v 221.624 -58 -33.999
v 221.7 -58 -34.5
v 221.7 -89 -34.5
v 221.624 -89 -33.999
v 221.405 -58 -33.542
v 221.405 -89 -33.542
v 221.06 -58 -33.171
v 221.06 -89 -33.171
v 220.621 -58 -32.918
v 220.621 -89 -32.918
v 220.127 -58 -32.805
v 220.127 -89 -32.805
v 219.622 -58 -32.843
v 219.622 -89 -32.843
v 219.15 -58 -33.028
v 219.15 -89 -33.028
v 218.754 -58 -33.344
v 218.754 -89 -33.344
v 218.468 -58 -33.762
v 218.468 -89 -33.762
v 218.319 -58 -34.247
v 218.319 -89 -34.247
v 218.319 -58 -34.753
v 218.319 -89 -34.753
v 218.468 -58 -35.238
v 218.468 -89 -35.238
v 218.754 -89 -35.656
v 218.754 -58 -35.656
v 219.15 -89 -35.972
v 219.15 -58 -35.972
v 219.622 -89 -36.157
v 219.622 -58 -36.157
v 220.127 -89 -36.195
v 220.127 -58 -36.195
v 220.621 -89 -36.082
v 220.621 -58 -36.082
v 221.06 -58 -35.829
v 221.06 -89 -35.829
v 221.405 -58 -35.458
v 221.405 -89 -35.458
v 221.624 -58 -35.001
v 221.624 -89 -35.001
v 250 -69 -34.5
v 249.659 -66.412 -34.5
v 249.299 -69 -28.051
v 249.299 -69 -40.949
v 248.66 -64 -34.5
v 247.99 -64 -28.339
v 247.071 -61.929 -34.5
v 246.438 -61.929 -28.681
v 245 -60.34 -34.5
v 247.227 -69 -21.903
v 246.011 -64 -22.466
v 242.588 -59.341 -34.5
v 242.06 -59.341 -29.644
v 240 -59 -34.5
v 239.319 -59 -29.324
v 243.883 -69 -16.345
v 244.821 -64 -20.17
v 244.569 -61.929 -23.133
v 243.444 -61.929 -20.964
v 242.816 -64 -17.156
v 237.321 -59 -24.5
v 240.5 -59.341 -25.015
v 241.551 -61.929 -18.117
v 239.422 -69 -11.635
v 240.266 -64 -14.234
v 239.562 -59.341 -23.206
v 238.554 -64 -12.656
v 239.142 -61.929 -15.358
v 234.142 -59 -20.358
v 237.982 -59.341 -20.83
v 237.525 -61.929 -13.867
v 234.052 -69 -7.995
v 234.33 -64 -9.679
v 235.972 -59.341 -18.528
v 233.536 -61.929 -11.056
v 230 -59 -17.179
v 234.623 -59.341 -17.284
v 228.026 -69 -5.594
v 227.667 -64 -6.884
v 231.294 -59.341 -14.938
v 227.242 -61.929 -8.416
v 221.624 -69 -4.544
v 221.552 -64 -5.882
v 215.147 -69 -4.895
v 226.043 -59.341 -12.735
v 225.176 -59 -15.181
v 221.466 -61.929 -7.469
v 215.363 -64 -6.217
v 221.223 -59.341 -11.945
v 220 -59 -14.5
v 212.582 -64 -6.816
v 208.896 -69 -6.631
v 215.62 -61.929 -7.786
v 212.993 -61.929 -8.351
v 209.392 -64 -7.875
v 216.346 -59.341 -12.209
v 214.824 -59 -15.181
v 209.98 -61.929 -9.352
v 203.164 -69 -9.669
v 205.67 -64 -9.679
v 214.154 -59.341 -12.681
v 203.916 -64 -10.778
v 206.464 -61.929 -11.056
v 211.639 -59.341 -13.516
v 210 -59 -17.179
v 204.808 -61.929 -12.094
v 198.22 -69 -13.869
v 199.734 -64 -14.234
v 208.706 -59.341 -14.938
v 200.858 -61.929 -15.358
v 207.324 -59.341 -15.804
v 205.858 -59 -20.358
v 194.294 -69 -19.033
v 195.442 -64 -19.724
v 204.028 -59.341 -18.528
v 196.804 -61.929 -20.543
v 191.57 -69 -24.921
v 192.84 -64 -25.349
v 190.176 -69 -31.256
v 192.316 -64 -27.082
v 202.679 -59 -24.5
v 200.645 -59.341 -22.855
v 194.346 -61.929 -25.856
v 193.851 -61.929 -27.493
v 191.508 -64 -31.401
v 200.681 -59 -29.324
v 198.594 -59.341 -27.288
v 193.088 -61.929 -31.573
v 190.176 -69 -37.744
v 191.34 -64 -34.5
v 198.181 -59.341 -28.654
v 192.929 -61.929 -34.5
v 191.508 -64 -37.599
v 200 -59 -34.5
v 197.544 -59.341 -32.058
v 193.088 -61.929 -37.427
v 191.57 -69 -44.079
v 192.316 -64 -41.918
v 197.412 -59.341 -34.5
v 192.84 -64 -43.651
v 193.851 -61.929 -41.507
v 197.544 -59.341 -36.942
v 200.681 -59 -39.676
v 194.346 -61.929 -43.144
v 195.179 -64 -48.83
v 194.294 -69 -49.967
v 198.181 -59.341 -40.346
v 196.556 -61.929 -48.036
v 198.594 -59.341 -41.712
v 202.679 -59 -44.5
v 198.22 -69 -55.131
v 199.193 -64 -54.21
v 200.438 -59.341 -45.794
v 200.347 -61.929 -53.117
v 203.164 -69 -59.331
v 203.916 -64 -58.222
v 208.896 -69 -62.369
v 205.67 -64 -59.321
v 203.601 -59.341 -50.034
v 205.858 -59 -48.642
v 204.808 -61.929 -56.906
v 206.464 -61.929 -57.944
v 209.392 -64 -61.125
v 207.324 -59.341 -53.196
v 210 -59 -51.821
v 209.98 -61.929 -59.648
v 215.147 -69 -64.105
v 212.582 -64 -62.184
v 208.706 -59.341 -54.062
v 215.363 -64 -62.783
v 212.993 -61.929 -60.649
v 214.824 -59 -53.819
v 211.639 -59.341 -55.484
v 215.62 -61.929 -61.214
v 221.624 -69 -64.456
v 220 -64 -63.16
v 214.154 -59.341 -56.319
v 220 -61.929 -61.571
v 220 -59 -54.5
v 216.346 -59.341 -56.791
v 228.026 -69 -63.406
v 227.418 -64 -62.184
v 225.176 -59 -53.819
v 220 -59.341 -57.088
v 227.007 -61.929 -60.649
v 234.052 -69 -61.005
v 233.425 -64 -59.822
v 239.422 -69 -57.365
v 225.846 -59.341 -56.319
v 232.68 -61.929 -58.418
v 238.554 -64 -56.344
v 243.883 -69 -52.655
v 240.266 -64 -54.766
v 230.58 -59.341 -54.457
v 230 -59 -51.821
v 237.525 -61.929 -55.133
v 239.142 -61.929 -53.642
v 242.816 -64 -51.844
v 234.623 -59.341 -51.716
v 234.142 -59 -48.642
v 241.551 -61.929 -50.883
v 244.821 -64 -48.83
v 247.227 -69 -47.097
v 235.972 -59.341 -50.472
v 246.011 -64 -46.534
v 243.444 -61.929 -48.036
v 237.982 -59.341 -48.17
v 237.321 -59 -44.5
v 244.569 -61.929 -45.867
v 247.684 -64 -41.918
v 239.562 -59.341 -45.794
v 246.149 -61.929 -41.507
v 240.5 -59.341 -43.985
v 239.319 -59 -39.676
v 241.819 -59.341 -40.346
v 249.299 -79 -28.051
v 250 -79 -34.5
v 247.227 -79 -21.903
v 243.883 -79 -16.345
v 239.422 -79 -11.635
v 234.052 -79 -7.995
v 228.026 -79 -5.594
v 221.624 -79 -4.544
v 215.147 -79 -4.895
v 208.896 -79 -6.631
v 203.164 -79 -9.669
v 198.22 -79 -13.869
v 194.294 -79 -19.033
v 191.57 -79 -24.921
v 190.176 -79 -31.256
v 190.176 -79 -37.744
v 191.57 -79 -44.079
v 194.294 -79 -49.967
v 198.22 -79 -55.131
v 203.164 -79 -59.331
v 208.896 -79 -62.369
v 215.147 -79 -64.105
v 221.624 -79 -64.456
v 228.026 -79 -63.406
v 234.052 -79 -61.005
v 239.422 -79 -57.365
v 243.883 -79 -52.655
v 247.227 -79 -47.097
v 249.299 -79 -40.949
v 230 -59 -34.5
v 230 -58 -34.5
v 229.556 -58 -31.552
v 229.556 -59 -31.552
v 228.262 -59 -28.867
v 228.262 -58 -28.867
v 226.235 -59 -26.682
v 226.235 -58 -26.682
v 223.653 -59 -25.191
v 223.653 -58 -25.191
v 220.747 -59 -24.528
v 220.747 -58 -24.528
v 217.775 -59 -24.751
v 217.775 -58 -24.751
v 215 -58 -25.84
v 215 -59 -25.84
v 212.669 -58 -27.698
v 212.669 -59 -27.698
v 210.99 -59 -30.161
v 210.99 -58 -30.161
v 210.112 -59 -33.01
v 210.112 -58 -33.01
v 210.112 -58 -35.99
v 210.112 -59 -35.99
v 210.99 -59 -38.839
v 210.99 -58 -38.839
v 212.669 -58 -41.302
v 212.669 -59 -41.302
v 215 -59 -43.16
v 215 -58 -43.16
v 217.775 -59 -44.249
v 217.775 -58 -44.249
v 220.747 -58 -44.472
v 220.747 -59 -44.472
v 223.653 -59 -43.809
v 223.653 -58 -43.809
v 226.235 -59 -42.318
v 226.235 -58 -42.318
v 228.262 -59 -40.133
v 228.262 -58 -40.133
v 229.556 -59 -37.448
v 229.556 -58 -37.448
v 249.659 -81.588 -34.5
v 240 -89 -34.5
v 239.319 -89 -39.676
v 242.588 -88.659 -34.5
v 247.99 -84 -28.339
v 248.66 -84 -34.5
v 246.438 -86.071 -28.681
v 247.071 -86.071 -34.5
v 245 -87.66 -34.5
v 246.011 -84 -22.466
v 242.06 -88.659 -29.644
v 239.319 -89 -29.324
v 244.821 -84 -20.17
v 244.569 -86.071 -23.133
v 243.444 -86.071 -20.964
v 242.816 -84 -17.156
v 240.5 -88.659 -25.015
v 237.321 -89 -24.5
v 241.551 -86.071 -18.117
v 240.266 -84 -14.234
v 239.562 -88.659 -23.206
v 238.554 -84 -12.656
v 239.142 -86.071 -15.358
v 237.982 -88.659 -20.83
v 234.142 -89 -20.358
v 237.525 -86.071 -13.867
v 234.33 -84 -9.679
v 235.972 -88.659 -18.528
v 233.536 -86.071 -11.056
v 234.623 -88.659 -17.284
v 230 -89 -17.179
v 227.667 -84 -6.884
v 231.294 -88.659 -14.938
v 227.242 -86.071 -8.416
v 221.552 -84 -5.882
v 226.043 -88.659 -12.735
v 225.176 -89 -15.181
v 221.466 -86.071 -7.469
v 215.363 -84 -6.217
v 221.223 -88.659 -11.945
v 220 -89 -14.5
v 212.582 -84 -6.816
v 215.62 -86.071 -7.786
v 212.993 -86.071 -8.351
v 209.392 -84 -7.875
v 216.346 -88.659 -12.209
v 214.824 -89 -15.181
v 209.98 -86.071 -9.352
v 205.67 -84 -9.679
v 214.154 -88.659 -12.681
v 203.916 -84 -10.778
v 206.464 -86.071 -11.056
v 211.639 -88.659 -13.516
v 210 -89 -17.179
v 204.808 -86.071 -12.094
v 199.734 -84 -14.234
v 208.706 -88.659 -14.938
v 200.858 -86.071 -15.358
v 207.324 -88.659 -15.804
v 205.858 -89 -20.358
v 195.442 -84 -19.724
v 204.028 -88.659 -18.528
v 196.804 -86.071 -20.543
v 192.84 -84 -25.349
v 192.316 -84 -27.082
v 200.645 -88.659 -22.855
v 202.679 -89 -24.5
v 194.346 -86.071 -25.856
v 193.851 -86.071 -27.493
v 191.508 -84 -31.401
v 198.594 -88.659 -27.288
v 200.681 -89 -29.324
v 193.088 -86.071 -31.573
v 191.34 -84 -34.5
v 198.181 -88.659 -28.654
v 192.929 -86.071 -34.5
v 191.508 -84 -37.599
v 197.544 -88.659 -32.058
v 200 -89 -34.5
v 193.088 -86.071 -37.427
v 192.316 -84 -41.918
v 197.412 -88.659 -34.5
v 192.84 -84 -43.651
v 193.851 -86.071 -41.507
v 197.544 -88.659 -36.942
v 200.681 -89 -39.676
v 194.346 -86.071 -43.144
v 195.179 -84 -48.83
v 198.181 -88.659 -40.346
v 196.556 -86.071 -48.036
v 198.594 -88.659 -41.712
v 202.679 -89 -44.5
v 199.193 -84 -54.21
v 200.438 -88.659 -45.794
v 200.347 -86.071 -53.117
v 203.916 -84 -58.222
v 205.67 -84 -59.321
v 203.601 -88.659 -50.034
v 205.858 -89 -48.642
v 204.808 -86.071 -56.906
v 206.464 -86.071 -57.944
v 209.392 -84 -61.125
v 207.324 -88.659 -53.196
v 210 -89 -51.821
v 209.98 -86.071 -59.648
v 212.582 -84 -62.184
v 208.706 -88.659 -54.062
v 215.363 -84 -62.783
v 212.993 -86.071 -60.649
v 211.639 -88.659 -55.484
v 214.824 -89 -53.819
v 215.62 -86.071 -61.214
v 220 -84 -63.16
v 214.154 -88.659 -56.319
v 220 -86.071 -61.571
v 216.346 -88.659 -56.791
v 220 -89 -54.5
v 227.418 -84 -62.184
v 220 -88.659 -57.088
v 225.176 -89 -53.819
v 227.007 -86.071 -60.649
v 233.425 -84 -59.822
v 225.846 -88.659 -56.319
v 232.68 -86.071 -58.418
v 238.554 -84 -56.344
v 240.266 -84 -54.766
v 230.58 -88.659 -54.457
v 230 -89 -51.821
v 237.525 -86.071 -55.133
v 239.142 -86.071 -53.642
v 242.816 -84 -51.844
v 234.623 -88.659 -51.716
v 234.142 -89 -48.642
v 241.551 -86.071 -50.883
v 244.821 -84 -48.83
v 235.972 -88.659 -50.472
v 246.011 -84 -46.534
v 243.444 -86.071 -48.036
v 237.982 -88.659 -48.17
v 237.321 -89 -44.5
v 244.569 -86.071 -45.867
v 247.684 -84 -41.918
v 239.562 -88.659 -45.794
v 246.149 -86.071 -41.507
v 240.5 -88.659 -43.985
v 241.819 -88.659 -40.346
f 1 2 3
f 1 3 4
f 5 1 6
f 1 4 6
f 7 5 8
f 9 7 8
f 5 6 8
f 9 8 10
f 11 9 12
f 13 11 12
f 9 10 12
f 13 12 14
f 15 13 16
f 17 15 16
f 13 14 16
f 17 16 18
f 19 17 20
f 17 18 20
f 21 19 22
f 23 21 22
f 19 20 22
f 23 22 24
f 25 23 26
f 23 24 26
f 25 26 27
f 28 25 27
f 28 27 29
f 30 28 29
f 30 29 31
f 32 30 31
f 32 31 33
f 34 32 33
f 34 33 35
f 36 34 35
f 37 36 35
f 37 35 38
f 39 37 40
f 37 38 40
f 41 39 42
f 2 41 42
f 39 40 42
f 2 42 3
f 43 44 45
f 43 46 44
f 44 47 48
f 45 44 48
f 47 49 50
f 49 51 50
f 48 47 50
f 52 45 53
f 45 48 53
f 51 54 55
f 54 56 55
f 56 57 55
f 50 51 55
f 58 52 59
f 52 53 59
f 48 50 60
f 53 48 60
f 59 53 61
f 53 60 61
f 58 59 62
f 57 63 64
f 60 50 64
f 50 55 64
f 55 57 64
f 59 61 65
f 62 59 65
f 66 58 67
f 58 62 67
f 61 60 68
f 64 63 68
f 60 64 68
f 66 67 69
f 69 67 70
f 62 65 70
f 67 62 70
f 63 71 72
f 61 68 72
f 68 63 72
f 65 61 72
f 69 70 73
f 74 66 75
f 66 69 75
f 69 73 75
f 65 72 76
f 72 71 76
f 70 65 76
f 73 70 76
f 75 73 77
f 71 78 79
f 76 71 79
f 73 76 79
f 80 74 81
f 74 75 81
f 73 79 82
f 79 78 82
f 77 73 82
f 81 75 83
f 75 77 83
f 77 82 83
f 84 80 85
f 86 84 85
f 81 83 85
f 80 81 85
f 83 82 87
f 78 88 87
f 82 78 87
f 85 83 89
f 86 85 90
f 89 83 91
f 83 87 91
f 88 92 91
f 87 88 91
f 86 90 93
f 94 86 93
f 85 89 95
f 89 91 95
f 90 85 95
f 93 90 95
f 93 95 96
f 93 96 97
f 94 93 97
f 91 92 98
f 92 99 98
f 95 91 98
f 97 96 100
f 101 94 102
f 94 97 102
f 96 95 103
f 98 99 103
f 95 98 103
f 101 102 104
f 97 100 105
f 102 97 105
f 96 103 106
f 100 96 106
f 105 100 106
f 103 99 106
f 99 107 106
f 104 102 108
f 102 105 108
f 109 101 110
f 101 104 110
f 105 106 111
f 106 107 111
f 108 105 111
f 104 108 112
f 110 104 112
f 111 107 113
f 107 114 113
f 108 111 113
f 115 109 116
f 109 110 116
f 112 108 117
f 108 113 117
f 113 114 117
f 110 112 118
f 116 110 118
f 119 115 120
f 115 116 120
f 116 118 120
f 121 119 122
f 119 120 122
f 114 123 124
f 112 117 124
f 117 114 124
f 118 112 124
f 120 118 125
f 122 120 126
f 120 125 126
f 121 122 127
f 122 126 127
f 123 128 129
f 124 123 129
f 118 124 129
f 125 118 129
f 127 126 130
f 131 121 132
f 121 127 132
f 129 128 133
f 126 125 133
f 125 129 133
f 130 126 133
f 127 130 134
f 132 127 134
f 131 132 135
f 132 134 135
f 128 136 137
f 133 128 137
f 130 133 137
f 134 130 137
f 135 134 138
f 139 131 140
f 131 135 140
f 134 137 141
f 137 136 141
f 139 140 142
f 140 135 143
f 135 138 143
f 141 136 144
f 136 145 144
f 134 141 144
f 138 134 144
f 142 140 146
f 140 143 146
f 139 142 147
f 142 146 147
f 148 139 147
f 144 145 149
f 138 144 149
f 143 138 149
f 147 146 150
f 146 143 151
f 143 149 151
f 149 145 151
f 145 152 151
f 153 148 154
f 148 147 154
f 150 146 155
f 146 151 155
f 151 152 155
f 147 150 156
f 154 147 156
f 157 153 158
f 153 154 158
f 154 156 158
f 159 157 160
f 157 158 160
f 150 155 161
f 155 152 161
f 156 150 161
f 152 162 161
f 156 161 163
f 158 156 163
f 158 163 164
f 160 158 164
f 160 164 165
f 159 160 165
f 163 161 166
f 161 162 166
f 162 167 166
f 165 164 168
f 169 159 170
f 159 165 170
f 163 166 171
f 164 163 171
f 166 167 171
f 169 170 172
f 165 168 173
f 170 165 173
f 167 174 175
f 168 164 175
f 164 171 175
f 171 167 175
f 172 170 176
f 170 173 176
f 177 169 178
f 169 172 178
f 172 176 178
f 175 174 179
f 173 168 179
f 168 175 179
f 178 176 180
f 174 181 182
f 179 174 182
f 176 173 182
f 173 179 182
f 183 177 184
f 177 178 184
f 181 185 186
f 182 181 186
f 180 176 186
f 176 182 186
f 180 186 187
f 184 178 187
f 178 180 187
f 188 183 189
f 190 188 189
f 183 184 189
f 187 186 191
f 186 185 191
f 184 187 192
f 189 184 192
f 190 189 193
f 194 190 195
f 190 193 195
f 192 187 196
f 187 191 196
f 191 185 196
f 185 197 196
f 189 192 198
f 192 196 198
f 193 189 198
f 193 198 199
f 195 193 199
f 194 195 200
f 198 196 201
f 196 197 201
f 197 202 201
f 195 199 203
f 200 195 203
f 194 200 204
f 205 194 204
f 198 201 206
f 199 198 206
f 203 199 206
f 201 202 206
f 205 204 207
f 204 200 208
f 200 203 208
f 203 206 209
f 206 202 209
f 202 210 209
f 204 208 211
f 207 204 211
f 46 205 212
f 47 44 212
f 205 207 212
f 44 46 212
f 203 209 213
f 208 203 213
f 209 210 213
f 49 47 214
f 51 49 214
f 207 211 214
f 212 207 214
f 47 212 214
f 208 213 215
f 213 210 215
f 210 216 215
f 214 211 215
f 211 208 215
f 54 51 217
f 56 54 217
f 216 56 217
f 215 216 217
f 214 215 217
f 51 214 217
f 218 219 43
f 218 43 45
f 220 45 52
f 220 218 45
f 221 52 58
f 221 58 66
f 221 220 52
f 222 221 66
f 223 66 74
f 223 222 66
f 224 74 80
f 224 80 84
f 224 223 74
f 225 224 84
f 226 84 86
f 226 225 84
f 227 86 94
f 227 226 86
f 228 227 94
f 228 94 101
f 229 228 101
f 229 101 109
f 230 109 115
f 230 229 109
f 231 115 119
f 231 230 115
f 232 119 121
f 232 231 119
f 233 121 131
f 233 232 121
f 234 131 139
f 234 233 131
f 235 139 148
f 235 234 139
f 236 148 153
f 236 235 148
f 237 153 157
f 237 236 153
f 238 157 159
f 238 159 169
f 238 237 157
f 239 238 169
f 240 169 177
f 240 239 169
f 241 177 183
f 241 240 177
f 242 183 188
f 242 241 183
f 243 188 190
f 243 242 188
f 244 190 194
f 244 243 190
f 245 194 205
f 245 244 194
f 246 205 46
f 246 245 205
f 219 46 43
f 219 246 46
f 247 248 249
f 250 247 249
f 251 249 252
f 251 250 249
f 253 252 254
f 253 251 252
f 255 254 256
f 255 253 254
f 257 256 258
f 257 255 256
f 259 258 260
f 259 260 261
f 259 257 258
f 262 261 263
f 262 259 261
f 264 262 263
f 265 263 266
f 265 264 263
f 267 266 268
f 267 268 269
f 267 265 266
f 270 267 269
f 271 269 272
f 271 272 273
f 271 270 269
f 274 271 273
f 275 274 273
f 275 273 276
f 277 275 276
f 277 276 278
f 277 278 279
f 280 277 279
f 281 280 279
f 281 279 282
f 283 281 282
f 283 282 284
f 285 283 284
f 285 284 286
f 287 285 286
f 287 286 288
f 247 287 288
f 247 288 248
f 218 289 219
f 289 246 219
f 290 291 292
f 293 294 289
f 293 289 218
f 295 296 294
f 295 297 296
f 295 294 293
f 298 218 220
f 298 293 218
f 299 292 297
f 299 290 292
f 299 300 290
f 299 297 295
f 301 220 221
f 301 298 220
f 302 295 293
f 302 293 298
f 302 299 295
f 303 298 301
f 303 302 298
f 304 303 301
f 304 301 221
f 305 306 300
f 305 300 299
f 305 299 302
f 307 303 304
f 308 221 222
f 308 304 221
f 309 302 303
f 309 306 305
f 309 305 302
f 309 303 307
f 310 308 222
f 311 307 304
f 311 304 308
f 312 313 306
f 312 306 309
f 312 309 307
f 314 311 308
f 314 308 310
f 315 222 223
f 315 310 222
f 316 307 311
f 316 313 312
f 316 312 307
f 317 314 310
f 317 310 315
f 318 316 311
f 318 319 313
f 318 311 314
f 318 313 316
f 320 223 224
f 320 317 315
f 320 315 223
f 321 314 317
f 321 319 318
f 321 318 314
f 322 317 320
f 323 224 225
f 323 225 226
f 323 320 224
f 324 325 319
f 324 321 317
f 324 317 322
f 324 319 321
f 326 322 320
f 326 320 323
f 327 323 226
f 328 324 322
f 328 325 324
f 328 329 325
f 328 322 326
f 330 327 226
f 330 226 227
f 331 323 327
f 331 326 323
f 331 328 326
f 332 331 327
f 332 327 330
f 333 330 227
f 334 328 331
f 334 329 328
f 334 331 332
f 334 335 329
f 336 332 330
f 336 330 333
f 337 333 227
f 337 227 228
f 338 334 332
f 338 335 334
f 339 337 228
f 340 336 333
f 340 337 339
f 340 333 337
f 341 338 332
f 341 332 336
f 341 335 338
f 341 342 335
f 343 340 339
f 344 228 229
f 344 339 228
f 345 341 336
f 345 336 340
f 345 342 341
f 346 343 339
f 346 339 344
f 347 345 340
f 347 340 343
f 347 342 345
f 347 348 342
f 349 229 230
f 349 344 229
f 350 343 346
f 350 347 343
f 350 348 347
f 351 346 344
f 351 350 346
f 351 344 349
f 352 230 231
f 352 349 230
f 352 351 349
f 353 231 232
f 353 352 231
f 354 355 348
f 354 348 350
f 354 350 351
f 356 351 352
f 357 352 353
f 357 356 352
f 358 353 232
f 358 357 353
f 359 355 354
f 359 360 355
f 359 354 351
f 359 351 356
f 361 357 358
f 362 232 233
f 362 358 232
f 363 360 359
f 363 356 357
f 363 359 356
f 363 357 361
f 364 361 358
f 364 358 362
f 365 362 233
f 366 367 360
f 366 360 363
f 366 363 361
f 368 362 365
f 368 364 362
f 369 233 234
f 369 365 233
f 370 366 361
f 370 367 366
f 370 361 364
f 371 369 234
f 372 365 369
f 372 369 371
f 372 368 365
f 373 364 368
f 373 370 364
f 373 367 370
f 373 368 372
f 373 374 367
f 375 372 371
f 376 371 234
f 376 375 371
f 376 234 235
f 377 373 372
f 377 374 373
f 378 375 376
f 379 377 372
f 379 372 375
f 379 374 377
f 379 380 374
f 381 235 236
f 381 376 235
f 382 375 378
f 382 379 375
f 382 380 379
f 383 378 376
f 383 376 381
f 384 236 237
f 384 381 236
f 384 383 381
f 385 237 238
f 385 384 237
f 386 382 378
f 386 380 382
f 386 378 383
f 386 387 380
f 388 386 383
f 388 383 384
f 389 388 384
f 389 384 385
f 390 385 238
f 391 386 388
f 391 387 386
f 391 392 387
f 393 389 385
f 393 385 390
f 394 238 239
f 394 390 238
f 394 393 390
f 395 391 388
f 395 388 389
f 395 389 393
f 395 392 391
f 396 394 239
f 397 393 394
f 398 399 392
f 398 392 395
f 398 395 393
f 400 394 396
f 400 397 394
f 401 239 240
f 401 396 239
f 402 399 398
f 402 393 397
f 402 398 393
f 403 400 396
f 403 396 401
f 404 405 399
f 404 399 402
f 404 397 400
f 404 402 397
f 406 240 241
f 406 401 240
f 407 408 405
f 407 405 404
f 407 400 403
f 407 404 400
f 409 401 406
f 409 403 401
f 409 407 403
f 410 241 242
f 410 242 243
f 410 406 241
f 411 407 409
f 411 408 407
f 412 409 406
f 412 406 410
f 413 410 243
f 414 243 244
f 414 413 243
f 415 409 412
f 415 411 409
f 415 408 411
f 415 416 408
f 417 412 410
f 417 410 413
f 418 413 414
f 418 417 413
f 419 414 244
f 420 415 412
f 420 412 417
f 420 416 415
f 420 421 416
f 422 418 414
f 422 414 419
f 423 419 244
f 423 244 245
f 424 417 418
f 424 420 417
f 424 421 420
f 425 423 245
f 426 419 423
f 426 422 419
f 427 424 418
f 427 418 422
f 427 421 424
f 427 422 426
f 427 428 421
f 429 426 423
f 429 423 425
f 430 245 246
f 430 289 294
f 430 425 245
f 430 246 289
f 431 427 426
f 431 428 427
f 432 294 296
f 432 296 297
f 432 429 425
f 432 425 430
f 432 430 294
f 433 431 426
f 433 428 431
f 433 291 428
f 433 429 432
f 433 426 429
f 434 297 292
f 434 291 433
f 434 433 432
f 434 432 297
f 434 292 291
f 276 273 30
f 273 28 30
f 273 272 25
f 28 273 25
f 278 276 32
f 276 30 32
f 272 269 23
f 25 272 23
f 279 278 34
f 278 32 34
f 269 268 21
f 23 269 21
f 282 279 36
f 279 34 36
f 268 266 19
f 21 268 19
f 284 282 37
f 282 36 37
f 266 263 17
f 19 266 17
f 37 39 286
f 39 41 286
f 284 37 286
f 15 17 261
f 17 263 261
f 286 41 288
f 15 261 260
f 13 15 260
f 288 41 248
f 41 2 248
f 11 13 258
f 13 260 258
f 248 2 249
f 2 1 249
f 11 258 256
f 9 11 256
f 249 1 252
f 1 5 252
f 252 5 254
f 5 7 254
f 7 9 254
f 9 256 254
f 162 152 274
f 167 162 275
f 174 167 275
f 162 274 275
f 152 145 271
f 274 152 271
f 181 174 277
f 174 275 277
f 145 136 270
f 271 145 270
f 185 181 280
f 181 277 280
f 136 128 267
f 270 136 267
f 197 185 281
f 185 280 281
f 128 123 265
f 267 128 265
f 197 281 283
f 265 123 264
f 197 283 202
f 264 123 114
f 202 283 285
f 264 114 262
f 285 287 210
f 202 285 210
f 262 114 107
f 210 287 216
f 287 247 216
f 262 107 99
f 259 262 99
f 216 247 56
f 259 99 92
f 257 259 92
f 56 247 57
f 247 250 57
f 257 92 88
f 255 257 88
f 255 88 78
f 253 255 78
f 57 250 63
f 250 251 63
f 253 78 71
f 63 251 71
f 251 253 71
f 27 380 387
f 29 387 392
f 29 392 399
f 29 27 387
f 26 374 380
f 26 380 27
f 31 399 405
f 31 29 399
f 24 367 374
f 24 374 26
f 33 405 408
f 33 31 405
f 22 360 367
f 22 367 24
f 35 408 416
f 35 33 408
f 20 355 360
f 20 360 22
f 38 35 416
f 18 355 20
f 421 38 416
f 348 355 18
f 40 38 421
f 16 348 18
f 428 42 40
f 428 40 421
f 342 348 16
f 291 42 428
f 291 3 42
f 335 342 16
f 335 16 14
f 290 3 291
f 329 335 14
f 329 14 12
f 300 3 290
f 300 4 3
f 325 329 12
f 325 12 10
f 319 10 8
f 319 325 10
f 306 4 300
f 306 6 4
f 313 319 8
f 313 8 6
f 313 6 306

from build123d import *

# Parameters (mm, degrees)
CYLINDER014_R          = 1.7
CYLINDER014_DEPTH      = 31
CYLINDER014_ROLL_ANGLE = 90
CYLINDER012_R          = 30
CYLINDER012_DEPTH      = 30
CYLINDER012_ROLL_ANGLE = 90
CYLINDER013_R          = 10
CYLINDER013_DEPTH      = 31
CYLINDER013_ROLL_ANGLE = 90
FILLET004_R            = 10


with BuildPart() as cilindro014:
    # Cylinder014 → Cylinder014 (new body)
    with BuildSketch(Plane.XY):
        Circle(CYLINDER014_R)
    extrude(amount=CYLINDER014_DEPTH)


with BuildPart() as cilindro014_1:
    # Cylinder014 roll: moved
    add(cilindro014.part.rotate(Axis((0, 0, 0), (1, 0, 0)), CYLINDER014_ROLL_ANGLE))


with BuildPart() as cilindro014_2:
    # Cylinder014 placement: moved
    add(cilindro014_1.part.moved(Location((220, 89, -34.5))))


with BuildPart() as cilindro012:
    # Cylinder012 → Cylinder012 (new body)
    with BuildSketch(Plane.XY):
        Circle(CYLINDER012_R)
    extrude(amount=CYLINDER012_DEPTH)


with BuildPart() as cilindro012_1:
    # Cylinder012 roll: moved
    add(cilindro012.part.rotate(Axis((0, 0, 0), (1, 0, 0)), CYLINDER012_ROLL_ANGLE))


with BuildPart() as cilindro012_2:
    # Cylinder012 placement: moved
    add(cilindro012_1.part.moved(Location((220, 89, -34.5))))


with BuildPart() as fillet004:
    # Cylinder013 → Cylinder013 (new body)
    with BuildSketch(Plane.XY):
        Circle(CYLINDER013_R)
    extrude(amount=CYLINDER013_DEPTH)


with BuildPart() as fillet004_1:
    # Cylinder013 roll: moved
    add(fillet004.part.rotate(Axis((0, 0, 0), (1, 0, 0)), CYLINDER013_ROLL_ANGLE))


with BuildPart() as fillet004_2:
    # Cylinder013 placement: moved
    add(fillet004_1.part.moved(Location((220, 89, -34.5))))

    # Fusion015: union Cilindro012
    add(cilindro012_2.part)

    # Cut008: cut Cilindro014
    add(cilindro014_2.part, mode=Mode.SUBTRACT)

    # Fillet004
    fillet004_edges = [fillet004_2.edges().sort_by_distance(p)[0] for p in [
        (190, 59, -34.5),
        (190, 89, -34.5),
    ]]
    fillet(fillet004_edges, radius=FILLET004_R)


with BuildPart() as part_mirroring001:
    # Part__Mirroring001: instance of Fillet004
    add(fillet004_2.part.mirror(Plane(origin=(220, -4e-06, -34.499992), x_dir=(1, 0, 0), z_dir=(0, 1, 0))))


solid = part_mirroring001.part
